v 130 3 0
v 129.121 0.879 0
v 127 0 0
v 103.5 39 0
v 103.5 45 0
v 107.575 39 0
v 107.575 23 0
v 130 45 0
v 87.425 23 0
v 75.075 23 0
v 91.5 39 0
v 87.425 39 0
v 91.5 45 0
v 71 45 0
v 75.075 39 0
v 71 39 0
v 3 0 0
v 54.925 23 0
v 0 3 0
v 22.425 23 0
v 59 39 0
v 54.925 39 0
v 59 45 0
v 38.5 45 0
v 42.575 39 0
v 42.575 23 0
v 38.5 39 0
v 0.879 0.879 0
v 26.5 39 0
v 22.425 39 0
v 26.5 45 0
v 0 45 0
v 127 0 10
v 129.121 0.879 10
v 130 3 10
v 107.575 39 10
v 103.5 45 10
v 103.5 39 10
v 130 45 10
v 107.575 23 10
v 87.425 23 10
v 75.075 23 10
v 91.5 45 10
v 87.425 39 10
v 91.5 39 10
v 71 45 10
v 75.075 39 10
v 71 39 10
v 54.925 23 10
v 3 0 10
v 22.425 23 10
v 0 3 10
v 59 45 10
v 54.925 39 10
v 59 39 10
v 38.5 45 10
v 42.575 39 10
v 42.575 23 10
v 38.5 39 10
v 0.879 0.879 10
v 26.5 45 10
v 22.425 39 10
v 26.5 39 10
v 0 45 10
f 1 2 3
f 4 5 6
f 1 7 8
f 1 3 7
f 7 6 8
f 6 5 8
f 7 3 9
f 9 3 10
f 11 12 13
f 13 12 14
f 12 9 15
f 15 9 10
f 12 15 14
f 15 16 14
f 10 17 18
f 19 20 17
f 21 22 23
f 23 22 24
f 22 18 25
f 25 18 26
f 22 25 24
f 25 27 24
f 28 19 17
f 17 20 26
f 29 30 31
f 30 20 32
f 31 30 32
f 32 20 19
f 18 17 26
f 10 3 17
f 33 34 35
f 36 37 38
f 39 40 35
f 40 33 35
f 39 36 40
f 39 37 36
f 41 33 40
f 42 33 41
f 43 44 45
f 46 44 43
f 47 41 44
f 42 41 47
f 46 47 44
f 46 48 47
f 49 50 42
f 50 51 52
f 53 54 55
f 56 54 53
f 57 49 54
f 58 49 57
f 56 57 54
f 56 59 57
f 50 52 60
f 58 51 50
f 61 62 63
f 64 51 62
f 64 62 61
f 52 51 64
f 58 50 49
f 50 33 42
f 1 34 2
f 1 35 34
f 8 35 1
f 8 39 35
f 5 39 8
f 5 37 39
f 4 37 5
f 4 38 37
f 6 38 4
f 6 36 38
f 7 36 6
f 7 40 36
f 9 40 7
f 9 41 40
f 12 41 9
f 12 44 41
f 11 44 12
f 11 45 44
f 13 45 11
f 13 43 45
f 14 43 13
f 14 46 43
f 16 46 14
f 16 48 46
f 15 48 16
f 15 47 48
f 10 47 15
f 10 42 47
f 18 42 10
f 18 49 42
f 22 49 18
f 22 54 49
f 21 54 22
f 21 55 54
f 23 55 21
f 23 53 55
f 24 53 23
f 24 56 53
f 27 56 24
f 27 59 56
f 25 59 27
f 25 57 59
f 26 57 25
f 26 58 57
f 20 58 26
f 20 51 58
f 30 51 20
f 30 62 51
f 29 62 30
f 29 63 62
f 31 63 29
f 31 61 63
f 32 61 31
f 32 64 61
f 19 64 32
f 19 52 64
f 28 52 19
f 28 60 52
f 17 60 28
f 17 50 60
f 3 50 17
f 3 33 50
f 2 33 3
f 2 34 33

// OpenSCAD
$fn = 32;

// ----------------------------------------------------------------------
// Window plate: 130 x 45 mm, 3 open windows
// ----------------------------------------------------------------------

// --- parameters (mm) ---
profile_height = 10;      // extrusion height
profile_points = 32;      // points of the closed outline

profile = [[0, 3], [0.879, 0.879], [3, 0], [127, 0], [129.121, 0.879], [130, 3], [130, 45], [103.5, 45], [103.5, 39], [107.575, 39], [107.575, 23], [87.425, 23], [87.425, 39], [91.5, 39], [91.5, 45], [71, 45], [71, 39], [75.075, 39], [75.075, 23], [54.925, 23], [54.925, 39], [59, 39], [59, 45], [38.5, 45], [38.5, 39], [42.575, 39], [42.575, 23], [22.425, 23], [22.425, 39], [26.5, 39], [26.5, 45], [0, 45]];  // single closed polygon, 32 points, counter clockwise

// --- the one profile operation ---
linear_extrude(height = profile_height) polygon(points = profile);
